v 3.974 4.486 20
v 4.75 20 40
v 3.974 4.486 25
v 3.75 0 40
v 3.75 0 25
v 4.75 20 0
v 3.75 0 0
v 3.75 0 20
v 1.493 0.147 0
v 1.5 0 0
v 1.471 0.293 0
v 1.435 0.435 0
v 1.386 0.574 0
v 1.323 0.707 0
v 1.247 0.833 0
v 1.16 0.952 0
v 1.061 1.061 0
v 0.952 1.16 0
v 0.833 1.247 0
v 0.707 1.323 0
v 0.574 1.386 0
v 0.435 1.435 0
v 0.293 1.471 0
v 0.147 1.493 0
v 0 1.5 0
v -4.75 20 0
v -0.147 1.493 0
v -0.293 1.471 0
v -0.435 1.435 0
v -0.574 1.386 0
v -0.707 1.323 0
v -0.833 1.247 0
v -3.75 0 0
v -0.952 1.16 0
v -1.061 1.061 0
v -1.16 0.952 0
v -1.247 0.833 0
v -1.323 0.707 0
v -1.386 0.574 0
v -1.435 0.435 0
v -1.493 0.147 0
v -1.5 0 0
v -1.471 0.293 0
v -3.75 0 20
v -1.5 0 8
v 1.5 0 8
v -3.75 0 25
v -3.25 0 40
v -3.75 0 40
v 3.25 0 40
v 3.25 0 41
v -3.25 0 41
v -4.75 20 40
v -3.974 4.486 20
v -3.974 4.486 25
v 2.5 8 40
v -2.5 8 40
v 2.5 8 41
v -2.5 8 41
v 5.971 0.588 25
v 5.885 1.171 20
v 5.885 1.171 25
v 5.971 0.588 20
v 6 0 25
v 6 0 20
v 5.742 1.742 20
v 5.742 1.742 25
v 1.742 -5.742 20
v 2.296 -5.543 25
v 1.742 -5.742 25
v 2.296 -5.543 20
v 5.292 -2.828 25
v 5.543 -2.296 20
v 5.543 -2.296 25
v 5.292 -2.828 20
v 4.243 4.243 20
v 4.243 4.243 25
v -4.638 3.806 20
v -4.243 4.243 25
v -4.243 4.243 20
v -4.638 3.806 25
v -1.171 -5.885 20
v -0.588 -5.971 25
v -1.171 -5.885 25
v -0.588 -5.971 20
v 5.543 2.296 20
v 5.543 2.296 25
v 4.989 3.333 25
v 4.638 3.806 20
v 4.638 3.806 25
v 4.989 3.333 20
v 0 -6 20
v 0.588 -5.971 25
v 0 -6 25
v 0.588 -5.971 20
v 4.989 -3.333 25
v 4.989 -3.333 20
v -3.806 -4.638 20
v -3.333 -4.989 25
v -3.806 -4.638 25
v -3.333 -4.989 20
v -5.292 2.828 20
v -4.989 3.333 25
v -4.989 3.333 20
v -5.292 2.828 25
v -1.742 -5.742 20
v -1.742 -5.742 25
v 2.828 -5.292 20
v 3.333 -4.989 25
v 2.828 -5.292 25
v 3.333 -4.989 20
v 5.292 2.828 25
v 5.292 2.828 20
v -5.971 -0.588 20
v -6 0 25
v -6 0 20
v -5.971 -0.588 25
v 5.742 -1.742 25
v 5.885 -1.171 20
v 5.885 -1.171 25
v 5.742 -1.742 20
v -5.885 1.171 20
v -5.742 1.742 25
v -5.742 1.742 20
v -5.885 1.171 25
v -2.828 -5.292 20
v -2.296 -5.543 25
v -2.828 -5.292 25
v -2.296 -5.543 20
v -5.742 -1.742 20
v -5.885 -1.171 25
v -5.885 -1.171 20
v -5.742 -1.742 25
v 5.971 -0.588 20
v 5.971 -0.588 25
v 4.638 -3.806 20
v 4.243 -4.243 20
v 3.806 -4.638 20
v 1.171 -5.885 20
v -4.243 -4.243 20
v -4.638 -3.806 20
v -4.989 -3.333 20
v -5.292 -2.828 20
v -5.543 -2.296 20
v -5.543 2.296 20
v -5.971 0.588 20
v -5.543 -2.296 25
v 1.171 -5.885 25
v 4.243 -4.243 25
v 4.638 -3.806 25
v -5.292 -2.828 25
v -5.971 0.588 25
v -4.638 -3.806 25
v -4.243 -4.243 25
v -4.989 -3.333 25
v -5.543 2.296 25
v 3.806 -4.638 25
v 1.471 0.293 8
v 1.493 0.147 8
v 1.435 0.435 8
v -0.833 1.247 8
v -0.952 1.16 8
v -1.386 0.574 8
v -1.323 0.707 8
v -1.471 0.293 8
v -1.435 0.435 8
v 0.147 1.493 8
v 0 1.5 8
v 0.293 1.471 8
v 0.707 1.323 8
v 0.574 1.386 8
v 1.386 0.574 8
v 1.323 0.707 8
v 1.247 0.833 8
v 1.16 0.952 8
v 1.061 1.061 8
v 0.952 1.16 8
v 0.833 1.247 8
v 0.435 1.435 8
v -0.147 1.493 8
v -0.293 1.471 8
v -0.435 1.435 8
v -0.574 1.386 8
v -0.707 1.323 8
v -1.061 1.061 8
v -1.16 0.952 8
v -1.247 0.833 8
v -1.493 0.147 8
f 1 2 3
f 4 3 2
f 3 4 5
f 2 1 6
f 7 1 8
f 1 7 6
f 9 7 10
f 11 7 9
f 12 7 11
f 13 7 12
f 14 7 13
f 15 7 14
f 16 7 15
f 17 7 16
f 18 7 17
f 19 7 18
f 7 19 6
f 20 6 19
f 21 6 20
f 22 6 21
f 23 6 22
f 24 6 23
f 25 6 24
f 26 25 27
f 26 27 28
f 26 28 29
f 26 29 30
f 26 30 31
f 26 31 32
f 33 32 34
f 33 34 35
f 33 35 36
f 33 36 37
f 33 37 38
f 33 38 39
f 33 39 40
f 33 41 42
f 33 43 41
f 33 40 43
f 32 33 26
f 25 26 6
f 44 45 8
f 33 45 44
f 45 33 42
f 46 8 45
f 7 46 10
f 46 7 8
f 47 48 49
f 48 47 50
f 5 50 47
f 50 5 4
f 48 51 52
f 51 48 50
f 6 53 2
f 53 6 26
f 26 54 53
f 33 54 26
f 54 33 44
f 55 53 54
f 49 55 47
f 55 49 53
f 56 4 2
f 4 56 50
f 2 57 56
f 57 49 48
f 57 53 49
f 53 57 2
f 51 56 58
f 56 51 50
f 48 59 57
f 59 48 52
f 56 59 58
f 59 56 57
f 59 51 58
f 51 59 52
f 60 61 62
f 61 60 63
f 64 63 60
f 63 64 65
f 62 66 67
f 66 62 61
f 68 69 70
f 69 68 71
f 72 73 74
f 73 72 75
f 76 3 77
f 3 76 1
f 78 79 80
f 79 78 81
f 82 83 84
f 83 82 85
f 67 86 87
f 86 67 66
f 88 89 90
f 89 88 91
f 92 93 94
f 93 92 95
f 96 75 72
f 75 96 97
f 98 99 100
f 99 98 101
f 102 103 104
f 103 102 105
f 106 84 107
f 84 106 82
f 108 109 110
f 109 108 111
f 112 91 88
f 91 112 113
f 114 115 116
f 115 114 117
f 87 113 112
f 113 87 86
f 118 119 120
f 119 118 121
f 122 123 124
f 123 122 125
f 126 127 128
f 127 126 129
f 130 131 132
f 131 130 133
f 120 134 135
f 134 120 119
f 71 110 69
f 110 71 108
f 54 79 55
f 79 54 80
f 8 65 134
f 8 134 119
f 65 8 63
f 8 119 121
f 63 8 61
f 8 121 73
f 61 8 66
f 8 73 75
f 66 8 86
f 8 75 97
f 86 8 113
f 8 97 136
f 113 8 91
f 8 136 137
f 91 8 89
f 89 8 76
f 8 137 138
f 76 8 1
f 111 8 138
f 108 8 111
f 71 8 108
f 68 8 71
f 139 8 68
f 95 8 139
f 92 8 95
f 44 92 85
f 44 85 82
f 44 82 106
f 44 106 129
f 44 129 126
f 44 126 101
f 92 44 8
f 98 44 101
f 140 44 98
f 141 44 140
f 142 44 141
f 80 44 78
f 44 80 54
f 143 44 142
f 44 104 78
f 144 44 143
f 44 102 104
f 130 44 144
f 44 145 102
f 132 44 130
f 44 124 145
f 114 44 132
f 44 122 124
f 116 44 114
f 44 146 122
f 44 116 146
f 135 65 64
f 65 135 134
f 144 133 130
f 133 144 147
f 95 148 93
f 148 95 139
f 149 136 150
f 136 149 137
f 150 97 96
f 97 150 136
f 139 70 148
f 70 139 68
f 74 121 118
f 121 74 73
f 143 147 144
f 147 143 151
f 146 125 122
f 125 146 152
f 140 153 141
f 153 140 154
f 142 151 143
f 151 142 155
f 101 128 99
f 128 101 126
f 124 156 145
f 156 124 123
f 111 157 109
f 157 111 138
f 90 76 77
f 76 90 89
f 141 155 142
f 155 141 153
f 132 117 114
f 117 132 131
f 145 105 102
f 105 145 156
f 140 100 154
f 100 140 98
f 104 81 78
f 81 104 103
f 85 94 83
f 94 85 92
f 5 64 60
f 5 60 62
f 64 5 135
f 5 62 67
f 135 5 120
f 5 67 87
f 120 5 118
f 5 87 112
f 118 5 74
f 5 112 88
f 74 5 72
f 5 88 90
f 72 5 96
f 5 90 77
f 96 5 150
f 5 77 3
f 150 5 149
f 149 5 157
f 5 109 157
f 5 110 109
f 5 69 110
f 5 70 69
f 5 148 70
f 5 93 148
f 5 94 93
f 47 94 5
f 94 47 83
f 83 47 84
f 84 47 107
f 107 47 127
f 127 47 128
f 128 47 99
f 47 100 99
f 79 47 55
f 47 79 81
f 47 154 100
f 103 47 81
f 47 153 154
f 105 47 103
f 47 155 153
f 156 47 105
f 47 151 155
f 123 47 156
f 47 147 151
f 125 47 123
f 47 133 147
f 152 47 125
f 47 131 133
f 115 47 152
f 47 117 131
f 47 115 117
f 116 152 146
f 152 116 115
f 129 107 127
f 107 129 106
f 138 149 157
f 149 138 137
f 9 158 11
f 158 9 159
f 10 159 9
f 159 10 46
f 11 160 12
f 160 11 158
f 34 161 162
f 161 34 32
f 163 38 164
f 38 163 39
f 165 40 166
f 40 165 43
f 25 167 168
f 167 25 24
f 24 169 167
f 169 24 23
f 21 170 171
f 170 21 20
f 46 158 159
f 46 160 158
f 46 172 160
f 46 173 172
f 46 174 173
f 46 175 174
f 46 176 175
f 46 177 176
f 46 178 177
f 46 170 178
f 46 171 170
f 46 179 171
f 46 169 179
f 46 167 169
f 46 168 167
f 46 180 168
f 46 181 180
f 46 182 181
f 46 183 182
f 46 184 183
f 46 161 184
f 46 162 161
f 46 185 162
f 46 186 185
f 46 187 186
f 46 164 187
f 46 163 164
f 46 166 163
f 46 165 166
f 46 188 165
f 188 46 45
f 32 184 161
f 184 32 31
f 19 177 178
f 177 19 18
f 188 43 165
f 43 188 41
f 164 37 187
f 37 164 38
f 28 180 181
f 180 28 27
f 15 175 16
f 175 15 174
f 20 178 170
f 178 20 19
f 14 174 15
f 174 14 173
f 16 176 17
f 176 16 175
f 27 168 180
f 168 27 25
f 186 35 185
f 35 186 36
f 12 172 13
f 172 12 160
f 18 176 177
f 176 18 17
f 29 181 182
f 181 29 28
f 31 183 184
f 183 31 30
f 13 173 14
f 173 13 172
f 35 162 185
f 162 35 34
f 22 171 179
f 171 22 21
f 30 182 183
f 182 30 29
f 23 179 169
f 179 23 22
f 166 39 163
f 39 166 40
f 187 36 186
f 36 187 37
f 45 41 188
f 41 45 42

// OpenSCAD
// Hose-barb reducer: 8 mm ID tubing to 5 mm ID tubing
// Print orientation: standing upright along Z

$fn = 64;

// ---- Dimensions (mm) ----
tube_8_d      = 8;    // inner diameter of larger tubing
tube_5_d      = 5;    // inner diameter of smaller tubing
wall          = 2;    // wall thickness for both barbs

barb_8_h      = 20;   // height of 8 mm barbs
barb_8_od     = 7.5;  // outer diameter at bottom of 8 mm barb
barb_8_top_od = 9.5;  // outer diameter at top of 8 mm barb

collar_d      = 12;   // diameter of cylindrical collar
collar_h      = 5;    // height of collar (z = 20 to 25)

barb_5_h      = 8;    // height of 5 mm barbs
barb_5_od     = 6.5;  // outer diameter at bottom of 5 mm barb
barb_5_top_od = 5.0;  // outer diameter at top of 5 mm barb

bore_d        = 3;    // through-bore diameter
eps           = 0.5;  // cutter overshoot past faces

// ---- Derived ----
barb_8_r_bottom = barb_8_od / 2;
barb_8_r_top    = barb_8_top_od / 2;
slope_8        = (barb_8_r_top - barb_8_r_bottom) / barb_8_h;

barb_5_r_bottom = barb_5_od / 2;
barb_5_r_top    = barb_5_top_od / 2;
slope_5        = (barb_5_r_top - barb_5_r_bottom) / barb_5_h;

// ---- Model ----
difference() {
    union() {
        // 8 mm barbs (z = 0 to 20), stacked
        for (i = [0 : 1])
            translate([0, 0, i * barb_8_h])
                linear_extrude(height = barb_8_h)
                    polygon(points = [
                        [-barb_8_r_bottom, 0],
                        [ barb_8_r_bottom, 0],
                        [ barb_8_r_top,   barb_8_h],
                        [-barb_8_r_top,   barb_8_h]
                    ]);

        // Collar (z = 20 to 25)
        translate([0, 0, barb_8_h])
            cylinder(d = collar_d, h = collar_h);

        // 5 mm barbs (z = 25 to 41), stacked
        for (i = [0 : 1])
            translate([0, 0, barb_8_h + collar_h + i * barb_5_h])
                linear_extrude(height = barb_5_h)
                    polygon(points = [
                        [-barb_5_r_bottom, 0],
                        [ barb_5_r_bottom, 0],
                        [ barb_5_r_top,   barb_5_h],
                        [-barb_5_r_top,   barb_5_h]
                    ]);
    }

    // Through-bore
    translate([0, 0, -eps])
        cylinder(d = bore_d, h = barb_5_h + eps);
}
